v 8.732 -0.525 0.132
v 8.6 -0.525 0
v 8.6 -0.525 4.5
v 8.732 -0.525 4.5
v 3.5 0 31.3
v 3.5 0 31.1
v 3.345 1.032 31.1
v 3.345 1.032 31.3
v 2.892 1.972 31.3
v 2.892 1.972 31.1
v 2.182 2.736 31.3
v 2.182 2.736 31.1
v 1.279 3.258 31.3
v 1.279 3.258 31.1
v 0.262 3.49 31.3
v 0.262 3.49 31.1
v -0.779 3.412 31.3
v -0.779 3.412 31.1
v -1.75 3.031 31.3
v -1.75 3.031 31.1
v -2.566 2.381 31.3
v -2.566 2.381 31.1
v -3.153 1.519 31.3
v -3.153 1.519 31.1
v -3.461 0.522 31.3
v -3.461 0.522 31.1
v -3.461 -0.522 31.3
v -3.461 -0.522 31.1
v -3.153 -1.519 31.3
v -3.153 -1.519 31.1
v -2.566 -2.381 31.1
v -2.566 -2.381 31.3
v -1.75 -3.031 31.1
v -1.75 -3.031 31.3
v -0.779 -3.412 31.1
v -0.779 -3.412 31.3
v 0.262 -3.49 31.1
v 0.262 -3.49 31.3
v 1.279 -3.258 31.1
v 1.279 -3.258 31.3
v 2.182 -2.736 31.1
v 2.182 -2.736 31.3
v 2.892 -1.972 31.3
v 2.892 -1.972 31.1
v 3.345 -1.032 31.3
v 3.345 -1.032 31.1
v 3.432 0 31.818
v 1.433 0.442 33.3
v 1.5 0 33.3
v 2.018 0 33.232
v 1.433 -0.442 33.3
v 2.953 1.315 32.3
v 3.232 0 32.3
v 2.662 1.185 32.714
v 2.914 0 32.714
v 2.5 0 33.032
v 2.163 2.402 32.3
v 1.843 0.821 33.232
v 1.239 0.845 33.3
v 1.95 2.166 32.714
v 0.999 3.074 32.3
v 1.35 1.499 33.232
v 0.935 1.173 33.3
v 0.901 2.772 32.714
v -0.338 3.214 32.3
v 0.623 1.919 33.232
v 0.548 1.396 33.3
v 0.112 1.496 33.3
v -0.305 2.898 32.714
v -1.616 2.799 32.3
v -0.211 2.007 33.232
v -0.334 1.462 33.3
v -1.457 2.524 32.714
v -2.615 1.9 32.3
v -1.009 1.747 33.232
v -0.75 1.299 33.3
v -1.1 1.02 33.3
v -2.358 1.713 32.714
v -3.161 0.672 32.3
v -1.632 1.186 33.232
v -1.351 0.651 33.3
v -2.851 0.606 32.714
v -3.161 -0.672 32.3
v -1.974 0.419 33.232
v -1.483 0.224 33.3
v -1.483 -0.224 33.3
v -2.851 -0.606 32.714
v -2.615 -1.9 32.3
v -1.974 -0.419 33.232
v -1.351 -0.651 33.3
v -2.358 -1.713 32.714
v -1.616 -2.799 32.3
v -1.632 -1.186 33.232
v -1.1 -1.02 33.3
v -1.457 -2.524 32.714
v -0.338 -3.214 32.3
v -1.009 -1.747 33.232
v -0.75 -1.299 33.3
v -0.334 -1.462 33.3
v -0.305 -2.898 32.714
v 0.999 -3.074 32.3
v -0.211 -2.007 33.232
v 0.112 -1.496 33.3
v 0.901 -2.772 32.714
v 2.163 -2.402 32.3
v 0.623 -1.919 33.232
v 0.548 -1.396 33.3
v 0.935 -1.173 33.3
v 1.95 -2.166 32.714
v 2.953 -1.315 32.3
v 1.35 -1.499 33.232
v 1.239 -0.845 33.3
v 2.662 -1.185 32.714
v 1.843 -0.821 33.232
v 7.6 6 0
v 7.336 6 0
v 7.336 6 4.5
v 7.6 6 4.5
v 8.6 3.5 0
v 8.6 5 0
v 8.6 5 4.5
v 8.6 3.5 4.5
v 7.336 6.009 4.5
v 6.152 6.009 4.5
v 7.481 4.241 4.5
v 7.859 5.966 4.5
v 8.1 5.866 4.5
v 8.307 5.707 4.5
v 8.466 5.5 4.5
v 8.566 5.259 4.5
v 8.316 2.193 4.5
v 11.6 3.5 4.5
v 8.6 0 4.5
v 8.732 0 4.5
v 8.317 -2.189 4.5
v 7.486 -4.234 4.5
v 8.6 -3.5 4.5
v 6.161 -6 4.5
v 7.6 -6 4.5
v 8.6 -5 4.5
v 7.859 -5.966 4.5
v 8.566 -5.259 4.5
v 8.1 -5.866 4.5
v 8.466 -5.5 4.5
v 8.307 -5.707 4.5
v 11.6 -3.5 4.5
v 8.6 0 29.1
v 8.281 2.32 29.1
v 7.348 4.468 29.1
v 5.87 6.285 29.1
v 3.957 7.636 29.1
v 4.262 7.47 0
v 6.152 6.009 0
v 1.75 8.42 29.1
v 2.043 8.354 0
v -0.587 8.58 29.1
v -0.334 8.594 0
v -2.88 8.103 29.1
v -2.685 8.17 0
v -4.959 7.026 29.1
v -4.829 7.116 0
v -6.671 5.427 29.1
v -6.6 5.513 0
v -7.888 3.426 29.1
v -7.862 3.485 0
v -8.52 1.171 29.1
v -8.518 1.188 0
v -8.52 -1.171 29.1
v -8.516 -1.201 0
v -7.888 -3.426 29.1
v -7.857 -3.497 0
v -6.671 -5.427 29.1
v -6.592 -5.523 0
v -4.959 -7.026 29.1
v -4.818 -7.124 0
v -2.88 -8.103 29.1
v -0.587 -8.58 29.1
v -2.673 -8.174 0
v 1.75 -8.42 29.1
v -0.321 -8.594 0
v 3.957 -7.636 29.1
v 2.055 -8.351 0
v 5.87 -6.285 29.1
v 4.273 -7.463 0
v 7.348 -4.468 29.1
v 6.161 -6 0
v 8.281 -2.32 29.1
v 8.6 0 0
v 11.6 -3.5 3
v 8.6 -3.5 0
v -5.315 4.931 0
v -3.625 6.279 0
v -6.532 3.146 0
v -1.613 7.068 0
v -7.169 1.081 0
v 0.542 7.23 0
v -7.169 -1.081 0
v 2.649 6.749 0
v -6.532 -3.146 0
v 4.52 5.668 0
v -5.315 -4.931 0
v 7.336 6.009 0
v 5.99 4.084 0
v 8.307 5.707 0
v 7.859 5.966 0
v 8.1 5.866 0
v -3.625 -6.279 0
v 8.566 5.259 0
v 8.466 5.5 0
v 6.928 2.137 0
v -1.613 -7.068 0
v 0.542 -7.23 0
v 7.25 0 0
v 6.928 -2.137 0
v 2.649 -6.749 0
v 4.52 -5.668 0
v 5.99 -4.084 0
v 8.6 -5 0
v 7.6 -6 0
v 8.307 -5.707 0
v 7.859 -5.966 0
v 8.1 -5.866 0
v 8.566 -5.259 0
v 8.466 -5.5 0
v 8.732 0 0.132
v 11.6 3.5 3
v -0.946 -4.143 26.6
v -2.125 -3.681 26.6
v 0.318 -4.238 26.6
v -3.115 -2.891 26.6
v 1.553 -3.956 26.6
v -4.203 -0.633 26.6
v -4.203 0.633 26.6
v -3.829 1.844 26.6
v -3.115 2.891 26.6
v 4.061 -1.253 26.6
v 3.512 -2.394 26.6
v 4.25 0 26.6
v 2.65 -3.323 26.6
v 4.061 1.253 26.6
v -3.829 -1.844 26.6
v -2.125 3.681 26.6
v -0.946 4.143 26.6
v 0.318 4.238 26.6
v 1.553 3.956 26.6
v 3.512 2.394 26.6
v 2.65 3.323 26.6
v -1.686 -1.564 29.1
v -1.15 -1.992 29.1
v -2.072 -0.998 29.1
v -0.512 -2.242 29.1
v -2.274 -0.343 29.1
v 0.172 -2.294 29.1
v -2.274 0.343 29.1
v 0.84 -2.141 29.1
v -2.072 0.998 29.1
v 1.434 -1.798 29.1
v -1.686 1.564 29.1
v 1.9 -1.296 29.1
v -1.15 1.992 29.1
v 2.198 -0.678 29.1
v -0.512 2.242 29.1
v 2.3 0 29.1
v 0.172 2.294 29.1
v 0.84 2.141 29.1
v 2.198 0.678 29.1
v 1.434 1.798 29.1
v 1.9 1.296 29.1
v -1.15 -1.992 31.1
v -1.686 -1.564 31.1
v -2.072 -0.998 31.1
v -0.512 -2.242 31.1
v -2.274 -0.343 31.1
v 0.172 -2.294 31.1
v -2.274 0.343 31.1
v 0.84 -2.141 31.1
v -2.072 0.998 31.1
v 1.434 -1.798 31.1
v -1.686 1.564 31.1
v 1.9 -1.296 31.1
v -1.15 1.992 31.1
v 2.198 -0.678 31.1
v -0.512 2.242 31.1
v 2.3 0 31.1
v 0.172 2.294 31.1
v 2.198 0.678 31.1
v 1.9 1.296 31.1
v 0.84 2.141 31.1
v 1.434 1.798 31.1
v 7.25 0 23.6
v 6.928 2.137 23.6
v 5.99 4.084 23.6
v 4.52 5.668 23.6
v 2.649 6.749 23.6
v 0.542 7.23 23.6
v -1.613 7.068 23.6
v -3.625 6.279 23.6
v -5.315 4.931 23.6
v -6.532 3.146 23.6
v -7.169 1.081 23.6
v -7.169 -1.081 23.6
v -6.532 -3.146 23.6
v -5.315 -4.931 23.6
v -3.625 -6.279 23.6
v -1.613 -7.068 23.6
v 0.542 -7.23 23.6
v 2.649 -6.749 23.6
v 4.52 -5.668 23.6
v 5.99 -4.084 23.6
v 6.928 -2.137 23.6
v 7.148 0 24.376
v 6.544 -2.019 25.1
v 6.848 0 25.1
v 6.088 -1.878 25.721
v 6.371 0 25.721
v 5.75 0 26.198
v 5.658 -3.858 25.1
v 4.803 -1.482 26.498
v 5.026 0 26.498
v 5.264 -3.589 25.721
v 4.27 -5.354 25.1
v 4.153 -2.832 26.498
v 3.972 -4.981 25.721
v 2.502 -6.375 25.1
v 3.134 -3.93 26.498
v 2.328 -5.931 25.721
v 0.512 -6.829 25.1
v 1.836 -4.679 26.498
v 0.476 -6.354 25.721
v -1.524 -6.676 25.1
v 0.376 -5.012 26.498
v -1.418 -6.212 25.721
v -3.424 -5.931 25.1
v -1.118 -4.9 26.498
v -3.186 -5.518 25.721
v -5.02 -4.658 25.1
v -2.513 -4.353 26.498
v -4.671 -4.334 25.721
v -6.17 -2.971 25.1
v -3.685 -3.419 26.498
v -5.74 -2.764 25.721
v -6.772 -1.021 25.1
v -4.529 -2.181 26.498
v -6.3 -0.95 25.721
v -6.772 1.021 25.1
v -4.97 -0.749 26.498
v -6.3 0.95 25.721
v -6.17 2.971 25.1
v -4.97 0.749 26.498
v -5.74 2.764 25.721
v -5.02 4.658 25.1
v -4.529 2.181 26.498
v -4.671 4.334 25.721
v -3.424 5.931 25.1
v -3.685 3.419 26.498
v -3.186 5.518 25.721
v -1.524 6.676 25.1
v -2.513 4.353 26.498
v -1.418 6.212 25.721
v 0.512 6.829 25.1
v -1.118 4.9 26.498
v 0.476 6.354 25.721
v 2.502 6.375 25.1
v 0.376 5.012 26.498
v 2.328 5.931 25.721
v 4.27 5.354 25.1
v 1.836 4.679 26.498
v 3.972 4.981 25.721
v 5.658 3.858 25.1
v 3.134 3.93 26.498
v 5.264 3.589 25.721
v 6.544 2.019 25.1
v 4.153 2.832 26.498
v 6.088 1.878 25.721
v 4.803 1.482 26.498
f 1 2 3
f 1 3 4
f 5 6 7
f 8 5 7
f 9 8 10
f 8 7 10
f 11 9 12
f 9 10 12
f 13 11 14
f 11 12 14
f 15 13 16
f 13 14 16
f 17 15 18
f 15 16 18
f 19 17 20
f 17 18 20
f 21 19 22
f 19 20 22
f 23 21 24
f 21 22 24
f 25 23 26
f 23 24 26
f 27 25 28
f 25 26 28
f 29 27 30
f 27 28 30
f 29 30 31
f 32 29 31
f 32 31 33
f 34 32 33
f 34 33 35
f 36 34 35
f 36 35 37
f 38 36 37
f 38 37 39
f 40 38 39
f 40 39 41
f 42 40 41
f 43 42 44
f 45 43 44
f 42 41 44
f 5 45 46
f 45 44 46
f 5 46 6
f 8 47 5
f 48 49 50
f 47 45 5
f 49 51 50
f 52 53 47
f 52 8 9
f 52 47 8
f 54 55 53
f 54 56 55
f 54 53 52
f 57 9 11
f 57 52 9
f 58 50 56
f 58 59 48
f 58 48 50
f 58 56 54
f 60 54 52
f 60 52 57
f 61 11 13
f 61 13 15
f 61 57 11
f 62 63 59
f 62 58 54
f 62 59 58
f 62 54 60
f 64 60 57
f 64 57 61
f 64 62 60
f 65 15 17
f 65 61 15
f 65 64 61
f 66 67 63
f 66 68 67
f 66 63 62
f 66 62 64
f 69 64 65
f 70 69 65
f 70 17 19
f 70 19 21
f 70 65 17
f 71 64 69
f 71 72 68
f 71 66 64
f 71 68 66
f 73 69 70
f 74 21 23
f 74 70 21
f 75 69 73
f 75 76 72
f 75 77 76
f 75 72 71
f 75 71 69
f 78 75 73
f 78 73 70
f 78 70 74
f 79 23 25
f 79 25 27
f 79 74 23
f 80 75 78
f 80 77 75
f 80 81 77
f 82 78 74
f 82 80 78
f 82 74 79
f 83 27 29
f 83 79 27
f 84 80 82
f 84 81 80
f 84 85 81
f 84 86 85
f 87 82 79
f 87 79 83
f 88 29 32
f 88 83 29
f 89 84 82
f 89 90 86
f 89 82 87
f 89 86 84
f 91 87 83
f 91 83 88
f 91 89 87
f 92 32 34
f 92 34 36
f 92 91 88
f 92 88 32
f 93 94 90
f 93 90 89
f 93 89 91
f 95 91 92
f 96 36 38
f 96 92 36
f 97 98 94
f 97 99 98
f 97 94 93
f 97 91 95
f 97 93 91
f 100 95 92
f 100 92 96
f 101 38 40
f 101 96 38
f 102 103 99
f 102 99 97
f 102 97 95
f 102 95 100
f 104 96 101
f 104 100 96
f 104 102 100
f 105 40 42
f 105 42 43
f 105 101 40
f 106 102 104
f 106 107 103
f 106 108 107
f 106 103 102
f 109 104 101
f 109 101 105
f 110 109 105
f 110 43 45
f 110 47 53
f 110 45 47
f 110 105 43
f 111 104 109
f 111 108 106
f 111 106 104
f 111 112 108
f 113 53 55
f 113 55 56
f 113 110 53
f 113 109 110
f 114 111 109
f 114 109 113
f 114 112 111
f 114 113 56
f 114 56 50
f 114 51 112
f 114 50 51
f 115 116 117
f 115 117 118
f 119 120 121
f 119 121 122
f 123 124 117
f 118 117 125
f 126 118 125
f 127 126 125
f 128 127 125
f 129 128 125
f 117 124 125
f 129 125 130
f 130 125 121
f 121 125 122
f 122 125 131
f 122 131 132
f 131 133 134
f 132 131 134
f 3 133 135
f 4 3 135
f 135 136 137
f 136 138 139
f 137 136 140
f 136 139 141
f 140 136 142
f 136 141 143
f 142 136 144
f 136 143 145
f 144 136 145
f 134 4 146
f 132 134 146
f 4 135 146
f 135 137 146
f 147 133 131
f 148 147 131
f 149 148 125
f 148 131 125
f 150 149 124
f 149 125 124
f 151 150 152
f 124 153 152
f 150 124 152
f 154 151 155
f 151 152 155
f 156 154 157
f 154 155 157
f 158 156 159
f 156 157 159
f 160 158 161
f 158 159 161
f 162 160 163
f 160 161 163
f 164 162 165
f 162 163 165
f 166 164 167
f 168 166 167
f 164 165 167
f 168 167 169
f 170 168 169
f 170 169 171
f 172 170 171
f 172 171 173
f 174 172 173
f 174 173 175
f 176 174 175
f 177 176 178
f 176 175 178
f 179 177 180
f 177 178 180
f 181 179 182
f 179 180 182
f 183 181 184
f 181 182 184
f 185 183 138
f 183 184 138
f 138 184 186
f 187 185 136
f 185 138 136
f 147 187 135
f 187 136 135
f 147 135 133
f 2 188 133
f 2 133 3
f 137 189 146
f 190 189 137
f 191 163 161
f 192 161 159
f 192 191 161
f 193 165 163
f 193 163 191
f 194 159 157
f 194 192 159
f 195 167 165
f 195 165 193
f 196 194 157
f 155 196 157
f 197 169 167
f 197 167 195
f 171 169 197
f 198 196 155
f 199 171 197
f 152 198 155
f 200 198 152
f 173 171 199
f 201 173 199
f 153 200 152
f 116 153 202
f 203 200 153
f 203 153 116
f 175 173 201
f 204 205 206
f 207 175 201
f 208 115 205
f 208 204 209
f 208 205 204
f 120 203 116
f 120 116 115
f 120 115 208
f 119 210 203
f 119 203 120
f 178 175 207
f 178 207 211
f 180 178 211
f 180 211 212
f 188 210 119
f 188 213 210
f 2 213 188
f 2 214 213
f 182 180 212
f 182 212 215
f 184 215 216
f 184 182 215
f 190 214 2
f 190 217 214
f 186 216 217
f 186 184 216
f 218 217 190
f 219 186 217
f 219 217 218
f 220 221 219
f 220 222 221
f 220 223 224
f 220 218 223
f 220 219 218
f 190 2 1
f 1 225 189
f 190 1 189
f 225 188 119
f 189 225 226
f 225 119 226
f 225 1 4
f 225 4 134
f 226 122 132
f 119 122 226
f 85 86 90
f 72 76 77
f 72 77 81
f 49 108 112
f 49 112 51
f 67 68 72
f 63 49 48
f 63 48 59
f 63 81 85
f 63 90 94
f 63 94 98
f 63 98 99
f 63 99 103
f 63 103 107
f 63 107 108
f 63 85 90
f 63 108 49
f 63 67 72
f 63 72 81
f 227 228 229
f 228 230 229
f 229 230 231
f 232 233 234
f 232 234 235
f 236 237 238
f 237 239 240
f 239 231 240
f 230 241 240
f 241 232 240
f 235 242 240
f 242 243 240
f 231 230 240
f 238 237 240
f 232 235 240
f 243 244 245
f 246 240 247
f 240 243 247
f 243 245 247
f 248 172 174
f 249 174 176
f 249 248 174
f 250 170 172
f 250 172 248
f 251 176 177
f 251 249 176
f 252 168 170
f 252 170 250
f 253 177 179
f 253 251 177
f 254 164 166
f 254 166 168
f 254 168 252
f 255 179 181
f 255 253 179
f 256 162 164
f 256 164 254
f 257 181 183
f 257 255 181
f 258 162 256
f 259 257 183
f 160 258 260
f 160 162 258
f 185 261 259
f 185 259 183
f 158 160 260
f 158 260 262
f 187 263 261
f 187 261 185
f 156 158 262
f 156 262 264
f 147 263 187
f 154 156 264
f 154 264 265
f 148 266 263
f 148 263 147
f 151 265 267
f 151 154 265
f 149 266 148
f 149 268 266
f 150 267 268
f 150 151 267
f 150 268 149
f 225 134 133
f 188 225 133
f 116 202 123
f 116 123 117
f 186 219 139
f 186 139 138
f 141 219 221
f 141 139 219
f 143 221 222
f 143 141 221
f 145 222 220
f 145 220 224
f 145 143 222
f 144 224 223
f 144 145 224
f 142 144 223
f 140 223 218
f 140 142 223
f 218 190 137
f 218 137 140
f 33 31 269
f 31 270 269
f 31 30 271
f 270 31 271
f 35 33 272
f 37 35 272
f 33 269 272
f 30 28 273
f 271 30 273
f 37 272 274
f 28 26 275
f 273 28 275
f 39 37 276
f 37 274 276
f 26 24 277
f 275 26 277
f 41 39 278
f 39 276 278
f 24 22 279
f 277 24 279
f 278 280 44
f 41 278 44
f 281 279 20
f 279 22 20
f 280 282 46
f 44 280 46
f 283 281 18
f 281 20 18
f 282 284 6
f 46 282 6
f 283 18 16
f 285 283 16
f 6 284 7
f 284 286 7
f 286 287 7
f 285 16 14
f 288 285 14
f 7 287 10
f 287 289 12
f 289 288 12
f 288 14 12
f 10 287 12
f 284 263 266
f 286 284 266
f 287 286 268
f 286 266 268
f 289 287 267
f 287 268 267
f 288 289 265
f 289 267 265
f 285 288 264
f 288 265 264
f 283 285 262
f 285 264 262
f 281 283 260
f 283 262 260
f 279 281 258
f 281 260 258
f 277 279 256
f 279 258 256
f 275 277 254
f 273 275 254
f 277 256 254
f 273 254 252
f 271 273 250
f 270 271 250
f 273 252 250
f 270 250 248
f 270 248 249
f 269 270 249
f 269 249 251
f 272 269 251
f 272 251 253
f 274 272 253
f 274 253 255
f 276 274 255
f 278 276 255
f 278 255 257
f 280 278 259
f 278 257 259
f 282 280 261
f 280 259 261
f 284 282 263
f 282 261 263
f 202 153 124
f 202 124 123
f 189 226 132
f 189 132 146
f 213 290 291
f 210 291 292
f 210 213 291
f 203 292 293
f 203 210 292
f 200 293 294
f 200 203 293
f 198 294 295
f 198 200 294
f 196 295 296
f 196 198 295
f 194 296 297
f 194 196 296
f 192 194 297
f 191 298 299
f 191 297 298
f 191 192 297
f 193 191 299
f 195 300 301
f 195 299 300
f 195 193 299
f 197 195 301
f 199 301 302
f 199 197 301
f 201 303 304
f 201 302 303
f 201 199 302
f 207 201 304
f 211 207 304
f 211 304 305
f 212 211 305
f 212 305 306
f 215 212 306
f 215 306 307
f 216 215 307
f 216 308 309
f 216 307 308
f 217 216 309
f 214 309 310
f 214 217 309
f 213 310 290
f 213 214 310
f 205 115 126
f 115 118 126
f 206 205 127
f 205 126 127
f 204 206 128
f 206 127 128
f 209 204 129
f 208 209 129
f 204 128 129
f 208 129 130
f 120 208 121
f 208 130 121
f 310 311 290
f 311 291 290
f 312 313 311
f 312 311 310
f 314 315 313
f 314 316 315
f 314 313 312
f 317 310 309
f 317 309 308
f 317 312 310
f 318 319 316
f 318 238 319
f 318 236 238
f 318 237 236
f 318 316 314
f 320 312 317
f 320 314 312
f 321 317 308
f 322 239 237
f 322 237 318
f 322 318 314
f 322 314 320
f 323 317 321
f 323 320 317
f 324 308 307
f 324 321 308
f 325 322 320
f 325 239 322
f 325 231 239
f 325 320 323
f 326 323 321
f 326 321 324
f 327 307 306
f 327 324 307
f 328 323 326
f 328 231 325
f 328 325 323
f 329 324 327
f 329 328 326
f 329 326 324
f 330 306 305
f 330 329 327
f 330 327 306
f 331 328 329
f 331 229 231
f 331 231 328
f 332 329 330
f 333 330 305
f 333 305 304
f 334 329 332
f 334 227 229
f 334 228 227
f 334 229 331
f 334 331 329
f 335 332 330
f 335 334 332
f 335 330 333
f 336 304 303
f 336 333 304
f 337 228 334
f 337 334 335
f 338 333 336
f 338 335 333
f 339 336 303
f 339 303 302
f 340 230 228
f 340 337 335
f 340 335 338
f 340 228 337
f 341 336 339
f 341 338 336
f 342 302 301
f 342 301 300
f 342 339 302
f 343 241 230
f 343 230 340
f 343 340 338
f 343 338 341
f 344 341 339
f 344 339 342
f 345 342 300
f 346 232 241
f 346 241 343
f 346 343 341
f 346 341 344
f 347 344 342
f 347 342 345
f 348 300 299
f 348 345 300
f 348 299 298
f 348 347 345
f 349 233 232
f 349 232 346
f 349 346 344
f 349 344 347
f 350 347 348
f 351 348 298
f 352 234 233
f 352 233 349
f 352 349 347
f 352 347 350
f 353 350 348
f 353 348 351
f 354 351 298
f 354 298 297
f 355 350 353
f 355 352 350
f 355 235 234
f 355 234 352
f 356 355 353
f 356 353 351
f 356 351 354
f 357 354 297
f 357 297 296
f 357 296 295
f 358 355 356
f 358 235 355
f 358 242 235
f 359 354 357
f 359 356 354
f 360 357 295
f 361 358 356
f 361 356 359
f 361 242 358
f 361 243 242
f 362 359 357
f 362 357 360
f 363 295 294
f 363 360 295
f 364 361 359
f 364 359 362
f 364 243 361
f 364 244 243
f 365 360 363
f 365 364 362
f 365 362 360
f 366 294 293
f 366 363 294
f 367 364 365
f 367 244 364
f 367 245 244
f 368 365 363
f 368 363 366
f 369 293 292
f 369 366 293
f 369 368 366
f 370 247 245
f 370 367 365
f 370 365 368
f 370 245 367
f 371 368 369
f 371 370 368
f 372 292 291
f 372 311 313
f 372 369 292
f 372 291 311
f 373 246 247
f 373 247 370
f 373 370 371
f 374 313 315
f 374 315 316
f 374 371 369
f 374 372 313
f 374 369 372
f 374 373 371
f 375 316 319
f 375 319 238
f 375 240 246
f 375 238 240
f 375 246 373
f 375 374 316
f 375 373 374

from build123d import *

# Parameters (mm, degrees)
F0_R         = 8.6
F0_R_2       = 7.25
F1_DEPTH     = 29.1
F2_R         = 8.6
F3_DEPTH     = 2.5
F4_R         = 3
F5_R         = 2.3
F6_DEPTH     = 2
F7_DEPTH     = 2
F8_R         = 3.5
F9_DEPTH     = 2.2
F10_R        = 2
F12_DEPTH    = 4.5
F13_T1_DEPTH = 22.4300979278
F14_R        = 1


# Not quite as in the source:
# - a fillet or chamfer that OpenCascade refuses, or shapes differently, is made with other operations: its cross-section is extruded or revolved along the edge and cut away or added


with BuildPart() as f1:
    # F0 (on Top) → F1 (new body)
    with BuildSketch(Plane.XY):
        Circle(F0_R)
        Circle(F0_R_2, mode=Mode.SUBTRACT)
    extrude(amount=F1_DEPTH)

    # F2 (on face) → F3 (join)
    with BuildSketch(Plane.XY.offset(29.1)):
        Circle(F2_R)
    extrude(amount=-F3_DEPTH)

    # F4
    f4_edges = [f1.edges().sort_by_distance(p)[0] for p in [
        (-7.25, 0, 26.6),
    ]]
    fillet(f4_edges, radius=F4_R)

    # F5 (on face) → F6 (join)
    with BuildSketch(Plane.XY.offset(29.1)):
        Circle(F5_R)
    extrude(amount=F6_DEPTH)

    # F5 (on face) → F7 (join)
    with BuildSketch(Plane.XY.offset(29.1)):
        Circle(F5_R)
    extrude(amount=-F7_DEPTH)

    # F8 (on face) → F9 (join)
    with BuildSketch(Plane.XY.offset(31.1)):
        Circle(F8_R)
    extrude(amount=F9_DEPTH)

    # F10
    f10_edges = [f1.edges().sort_by_distance(p)[0] for p in [
        (-3.5, 0, 33.3),
    ]]
    fillet(f10_edges, radius=F10_R)

    # F11 (on face) → F12 (join)
    with BuildSketch(Plane(origin=(0, 0, 0), x_dir=(1, 0, 0), z_dir=(0, 0, -1))):
        Polygon((8.6, -3.5), (8.6, 0), (7.3356842622, 0), (7.3356842622, -6), (8.6, -6), align=None)
        Polygon((7.3356842622, 0), (8.6, 0), (8.6, 0.5253988202), (8.6, 3.5), (8.6, 6), (7.3356842622, 6), align=None)
        Polygon((8.7317479774, 0), (8.6, 0), (8.6, -3.5), (11.6, -3.5), (11.6, 0), align=None)
        with BuildLine():
            Line((7.3356842622, -6), (7.3356842622, 0))
            Line((7.3356842622, 0), (7.3356842622, 6))
            Line((7.3356842622, 6), (6.1521958246, 6))
            Line((6.1521958246, 6), (6.1521958246, 3.8678361166))
            ThreePointArc((6.1521958246, 3.8678361166), (7.267026193, 0), (6.1521958246, -3.8678361166))
            Line((6.1521958246, -3.8678361166), (6.1521958246, -6.0092001577))
            Line((6.1521958246, -6.0092001577), (7.3356842622, -6.0092001577))
            Line((7.3356842622, -6.0092001577), (7.3356842622, -6))
        make_face()
        Polygon((8.6, 3.5), (8.6, 0.5253988202), (8.7317479774, 0.5253988202), (8.7317479774, 0), (11.6, 0), (11.6, 3.5), align=None)
    extrude(amount=-F12_DEPTH)

    # F13: chamfer of 3 on 1 edges, made by hand

    # F13_s2 → F13_t1 (cut)
    with BuildSketch(Plane.XZ.offset(-11.2150489639)):
        Polygon((8.6, 0), (11.6, 3), (11.6, 0), align=None)
    extrude(amount=F13_T1_DEPTH, mode=Mode.SUBTRACT)

    # F14
    f14_edges = [f1.edges().sort_by_distance(p)[0] for p in [
        (8.6, 6, 2.25),
        (8.6, -6, 2.25),
    ]]
    fillet(f14_edges, radius=F14_R)


solid = f1.part
